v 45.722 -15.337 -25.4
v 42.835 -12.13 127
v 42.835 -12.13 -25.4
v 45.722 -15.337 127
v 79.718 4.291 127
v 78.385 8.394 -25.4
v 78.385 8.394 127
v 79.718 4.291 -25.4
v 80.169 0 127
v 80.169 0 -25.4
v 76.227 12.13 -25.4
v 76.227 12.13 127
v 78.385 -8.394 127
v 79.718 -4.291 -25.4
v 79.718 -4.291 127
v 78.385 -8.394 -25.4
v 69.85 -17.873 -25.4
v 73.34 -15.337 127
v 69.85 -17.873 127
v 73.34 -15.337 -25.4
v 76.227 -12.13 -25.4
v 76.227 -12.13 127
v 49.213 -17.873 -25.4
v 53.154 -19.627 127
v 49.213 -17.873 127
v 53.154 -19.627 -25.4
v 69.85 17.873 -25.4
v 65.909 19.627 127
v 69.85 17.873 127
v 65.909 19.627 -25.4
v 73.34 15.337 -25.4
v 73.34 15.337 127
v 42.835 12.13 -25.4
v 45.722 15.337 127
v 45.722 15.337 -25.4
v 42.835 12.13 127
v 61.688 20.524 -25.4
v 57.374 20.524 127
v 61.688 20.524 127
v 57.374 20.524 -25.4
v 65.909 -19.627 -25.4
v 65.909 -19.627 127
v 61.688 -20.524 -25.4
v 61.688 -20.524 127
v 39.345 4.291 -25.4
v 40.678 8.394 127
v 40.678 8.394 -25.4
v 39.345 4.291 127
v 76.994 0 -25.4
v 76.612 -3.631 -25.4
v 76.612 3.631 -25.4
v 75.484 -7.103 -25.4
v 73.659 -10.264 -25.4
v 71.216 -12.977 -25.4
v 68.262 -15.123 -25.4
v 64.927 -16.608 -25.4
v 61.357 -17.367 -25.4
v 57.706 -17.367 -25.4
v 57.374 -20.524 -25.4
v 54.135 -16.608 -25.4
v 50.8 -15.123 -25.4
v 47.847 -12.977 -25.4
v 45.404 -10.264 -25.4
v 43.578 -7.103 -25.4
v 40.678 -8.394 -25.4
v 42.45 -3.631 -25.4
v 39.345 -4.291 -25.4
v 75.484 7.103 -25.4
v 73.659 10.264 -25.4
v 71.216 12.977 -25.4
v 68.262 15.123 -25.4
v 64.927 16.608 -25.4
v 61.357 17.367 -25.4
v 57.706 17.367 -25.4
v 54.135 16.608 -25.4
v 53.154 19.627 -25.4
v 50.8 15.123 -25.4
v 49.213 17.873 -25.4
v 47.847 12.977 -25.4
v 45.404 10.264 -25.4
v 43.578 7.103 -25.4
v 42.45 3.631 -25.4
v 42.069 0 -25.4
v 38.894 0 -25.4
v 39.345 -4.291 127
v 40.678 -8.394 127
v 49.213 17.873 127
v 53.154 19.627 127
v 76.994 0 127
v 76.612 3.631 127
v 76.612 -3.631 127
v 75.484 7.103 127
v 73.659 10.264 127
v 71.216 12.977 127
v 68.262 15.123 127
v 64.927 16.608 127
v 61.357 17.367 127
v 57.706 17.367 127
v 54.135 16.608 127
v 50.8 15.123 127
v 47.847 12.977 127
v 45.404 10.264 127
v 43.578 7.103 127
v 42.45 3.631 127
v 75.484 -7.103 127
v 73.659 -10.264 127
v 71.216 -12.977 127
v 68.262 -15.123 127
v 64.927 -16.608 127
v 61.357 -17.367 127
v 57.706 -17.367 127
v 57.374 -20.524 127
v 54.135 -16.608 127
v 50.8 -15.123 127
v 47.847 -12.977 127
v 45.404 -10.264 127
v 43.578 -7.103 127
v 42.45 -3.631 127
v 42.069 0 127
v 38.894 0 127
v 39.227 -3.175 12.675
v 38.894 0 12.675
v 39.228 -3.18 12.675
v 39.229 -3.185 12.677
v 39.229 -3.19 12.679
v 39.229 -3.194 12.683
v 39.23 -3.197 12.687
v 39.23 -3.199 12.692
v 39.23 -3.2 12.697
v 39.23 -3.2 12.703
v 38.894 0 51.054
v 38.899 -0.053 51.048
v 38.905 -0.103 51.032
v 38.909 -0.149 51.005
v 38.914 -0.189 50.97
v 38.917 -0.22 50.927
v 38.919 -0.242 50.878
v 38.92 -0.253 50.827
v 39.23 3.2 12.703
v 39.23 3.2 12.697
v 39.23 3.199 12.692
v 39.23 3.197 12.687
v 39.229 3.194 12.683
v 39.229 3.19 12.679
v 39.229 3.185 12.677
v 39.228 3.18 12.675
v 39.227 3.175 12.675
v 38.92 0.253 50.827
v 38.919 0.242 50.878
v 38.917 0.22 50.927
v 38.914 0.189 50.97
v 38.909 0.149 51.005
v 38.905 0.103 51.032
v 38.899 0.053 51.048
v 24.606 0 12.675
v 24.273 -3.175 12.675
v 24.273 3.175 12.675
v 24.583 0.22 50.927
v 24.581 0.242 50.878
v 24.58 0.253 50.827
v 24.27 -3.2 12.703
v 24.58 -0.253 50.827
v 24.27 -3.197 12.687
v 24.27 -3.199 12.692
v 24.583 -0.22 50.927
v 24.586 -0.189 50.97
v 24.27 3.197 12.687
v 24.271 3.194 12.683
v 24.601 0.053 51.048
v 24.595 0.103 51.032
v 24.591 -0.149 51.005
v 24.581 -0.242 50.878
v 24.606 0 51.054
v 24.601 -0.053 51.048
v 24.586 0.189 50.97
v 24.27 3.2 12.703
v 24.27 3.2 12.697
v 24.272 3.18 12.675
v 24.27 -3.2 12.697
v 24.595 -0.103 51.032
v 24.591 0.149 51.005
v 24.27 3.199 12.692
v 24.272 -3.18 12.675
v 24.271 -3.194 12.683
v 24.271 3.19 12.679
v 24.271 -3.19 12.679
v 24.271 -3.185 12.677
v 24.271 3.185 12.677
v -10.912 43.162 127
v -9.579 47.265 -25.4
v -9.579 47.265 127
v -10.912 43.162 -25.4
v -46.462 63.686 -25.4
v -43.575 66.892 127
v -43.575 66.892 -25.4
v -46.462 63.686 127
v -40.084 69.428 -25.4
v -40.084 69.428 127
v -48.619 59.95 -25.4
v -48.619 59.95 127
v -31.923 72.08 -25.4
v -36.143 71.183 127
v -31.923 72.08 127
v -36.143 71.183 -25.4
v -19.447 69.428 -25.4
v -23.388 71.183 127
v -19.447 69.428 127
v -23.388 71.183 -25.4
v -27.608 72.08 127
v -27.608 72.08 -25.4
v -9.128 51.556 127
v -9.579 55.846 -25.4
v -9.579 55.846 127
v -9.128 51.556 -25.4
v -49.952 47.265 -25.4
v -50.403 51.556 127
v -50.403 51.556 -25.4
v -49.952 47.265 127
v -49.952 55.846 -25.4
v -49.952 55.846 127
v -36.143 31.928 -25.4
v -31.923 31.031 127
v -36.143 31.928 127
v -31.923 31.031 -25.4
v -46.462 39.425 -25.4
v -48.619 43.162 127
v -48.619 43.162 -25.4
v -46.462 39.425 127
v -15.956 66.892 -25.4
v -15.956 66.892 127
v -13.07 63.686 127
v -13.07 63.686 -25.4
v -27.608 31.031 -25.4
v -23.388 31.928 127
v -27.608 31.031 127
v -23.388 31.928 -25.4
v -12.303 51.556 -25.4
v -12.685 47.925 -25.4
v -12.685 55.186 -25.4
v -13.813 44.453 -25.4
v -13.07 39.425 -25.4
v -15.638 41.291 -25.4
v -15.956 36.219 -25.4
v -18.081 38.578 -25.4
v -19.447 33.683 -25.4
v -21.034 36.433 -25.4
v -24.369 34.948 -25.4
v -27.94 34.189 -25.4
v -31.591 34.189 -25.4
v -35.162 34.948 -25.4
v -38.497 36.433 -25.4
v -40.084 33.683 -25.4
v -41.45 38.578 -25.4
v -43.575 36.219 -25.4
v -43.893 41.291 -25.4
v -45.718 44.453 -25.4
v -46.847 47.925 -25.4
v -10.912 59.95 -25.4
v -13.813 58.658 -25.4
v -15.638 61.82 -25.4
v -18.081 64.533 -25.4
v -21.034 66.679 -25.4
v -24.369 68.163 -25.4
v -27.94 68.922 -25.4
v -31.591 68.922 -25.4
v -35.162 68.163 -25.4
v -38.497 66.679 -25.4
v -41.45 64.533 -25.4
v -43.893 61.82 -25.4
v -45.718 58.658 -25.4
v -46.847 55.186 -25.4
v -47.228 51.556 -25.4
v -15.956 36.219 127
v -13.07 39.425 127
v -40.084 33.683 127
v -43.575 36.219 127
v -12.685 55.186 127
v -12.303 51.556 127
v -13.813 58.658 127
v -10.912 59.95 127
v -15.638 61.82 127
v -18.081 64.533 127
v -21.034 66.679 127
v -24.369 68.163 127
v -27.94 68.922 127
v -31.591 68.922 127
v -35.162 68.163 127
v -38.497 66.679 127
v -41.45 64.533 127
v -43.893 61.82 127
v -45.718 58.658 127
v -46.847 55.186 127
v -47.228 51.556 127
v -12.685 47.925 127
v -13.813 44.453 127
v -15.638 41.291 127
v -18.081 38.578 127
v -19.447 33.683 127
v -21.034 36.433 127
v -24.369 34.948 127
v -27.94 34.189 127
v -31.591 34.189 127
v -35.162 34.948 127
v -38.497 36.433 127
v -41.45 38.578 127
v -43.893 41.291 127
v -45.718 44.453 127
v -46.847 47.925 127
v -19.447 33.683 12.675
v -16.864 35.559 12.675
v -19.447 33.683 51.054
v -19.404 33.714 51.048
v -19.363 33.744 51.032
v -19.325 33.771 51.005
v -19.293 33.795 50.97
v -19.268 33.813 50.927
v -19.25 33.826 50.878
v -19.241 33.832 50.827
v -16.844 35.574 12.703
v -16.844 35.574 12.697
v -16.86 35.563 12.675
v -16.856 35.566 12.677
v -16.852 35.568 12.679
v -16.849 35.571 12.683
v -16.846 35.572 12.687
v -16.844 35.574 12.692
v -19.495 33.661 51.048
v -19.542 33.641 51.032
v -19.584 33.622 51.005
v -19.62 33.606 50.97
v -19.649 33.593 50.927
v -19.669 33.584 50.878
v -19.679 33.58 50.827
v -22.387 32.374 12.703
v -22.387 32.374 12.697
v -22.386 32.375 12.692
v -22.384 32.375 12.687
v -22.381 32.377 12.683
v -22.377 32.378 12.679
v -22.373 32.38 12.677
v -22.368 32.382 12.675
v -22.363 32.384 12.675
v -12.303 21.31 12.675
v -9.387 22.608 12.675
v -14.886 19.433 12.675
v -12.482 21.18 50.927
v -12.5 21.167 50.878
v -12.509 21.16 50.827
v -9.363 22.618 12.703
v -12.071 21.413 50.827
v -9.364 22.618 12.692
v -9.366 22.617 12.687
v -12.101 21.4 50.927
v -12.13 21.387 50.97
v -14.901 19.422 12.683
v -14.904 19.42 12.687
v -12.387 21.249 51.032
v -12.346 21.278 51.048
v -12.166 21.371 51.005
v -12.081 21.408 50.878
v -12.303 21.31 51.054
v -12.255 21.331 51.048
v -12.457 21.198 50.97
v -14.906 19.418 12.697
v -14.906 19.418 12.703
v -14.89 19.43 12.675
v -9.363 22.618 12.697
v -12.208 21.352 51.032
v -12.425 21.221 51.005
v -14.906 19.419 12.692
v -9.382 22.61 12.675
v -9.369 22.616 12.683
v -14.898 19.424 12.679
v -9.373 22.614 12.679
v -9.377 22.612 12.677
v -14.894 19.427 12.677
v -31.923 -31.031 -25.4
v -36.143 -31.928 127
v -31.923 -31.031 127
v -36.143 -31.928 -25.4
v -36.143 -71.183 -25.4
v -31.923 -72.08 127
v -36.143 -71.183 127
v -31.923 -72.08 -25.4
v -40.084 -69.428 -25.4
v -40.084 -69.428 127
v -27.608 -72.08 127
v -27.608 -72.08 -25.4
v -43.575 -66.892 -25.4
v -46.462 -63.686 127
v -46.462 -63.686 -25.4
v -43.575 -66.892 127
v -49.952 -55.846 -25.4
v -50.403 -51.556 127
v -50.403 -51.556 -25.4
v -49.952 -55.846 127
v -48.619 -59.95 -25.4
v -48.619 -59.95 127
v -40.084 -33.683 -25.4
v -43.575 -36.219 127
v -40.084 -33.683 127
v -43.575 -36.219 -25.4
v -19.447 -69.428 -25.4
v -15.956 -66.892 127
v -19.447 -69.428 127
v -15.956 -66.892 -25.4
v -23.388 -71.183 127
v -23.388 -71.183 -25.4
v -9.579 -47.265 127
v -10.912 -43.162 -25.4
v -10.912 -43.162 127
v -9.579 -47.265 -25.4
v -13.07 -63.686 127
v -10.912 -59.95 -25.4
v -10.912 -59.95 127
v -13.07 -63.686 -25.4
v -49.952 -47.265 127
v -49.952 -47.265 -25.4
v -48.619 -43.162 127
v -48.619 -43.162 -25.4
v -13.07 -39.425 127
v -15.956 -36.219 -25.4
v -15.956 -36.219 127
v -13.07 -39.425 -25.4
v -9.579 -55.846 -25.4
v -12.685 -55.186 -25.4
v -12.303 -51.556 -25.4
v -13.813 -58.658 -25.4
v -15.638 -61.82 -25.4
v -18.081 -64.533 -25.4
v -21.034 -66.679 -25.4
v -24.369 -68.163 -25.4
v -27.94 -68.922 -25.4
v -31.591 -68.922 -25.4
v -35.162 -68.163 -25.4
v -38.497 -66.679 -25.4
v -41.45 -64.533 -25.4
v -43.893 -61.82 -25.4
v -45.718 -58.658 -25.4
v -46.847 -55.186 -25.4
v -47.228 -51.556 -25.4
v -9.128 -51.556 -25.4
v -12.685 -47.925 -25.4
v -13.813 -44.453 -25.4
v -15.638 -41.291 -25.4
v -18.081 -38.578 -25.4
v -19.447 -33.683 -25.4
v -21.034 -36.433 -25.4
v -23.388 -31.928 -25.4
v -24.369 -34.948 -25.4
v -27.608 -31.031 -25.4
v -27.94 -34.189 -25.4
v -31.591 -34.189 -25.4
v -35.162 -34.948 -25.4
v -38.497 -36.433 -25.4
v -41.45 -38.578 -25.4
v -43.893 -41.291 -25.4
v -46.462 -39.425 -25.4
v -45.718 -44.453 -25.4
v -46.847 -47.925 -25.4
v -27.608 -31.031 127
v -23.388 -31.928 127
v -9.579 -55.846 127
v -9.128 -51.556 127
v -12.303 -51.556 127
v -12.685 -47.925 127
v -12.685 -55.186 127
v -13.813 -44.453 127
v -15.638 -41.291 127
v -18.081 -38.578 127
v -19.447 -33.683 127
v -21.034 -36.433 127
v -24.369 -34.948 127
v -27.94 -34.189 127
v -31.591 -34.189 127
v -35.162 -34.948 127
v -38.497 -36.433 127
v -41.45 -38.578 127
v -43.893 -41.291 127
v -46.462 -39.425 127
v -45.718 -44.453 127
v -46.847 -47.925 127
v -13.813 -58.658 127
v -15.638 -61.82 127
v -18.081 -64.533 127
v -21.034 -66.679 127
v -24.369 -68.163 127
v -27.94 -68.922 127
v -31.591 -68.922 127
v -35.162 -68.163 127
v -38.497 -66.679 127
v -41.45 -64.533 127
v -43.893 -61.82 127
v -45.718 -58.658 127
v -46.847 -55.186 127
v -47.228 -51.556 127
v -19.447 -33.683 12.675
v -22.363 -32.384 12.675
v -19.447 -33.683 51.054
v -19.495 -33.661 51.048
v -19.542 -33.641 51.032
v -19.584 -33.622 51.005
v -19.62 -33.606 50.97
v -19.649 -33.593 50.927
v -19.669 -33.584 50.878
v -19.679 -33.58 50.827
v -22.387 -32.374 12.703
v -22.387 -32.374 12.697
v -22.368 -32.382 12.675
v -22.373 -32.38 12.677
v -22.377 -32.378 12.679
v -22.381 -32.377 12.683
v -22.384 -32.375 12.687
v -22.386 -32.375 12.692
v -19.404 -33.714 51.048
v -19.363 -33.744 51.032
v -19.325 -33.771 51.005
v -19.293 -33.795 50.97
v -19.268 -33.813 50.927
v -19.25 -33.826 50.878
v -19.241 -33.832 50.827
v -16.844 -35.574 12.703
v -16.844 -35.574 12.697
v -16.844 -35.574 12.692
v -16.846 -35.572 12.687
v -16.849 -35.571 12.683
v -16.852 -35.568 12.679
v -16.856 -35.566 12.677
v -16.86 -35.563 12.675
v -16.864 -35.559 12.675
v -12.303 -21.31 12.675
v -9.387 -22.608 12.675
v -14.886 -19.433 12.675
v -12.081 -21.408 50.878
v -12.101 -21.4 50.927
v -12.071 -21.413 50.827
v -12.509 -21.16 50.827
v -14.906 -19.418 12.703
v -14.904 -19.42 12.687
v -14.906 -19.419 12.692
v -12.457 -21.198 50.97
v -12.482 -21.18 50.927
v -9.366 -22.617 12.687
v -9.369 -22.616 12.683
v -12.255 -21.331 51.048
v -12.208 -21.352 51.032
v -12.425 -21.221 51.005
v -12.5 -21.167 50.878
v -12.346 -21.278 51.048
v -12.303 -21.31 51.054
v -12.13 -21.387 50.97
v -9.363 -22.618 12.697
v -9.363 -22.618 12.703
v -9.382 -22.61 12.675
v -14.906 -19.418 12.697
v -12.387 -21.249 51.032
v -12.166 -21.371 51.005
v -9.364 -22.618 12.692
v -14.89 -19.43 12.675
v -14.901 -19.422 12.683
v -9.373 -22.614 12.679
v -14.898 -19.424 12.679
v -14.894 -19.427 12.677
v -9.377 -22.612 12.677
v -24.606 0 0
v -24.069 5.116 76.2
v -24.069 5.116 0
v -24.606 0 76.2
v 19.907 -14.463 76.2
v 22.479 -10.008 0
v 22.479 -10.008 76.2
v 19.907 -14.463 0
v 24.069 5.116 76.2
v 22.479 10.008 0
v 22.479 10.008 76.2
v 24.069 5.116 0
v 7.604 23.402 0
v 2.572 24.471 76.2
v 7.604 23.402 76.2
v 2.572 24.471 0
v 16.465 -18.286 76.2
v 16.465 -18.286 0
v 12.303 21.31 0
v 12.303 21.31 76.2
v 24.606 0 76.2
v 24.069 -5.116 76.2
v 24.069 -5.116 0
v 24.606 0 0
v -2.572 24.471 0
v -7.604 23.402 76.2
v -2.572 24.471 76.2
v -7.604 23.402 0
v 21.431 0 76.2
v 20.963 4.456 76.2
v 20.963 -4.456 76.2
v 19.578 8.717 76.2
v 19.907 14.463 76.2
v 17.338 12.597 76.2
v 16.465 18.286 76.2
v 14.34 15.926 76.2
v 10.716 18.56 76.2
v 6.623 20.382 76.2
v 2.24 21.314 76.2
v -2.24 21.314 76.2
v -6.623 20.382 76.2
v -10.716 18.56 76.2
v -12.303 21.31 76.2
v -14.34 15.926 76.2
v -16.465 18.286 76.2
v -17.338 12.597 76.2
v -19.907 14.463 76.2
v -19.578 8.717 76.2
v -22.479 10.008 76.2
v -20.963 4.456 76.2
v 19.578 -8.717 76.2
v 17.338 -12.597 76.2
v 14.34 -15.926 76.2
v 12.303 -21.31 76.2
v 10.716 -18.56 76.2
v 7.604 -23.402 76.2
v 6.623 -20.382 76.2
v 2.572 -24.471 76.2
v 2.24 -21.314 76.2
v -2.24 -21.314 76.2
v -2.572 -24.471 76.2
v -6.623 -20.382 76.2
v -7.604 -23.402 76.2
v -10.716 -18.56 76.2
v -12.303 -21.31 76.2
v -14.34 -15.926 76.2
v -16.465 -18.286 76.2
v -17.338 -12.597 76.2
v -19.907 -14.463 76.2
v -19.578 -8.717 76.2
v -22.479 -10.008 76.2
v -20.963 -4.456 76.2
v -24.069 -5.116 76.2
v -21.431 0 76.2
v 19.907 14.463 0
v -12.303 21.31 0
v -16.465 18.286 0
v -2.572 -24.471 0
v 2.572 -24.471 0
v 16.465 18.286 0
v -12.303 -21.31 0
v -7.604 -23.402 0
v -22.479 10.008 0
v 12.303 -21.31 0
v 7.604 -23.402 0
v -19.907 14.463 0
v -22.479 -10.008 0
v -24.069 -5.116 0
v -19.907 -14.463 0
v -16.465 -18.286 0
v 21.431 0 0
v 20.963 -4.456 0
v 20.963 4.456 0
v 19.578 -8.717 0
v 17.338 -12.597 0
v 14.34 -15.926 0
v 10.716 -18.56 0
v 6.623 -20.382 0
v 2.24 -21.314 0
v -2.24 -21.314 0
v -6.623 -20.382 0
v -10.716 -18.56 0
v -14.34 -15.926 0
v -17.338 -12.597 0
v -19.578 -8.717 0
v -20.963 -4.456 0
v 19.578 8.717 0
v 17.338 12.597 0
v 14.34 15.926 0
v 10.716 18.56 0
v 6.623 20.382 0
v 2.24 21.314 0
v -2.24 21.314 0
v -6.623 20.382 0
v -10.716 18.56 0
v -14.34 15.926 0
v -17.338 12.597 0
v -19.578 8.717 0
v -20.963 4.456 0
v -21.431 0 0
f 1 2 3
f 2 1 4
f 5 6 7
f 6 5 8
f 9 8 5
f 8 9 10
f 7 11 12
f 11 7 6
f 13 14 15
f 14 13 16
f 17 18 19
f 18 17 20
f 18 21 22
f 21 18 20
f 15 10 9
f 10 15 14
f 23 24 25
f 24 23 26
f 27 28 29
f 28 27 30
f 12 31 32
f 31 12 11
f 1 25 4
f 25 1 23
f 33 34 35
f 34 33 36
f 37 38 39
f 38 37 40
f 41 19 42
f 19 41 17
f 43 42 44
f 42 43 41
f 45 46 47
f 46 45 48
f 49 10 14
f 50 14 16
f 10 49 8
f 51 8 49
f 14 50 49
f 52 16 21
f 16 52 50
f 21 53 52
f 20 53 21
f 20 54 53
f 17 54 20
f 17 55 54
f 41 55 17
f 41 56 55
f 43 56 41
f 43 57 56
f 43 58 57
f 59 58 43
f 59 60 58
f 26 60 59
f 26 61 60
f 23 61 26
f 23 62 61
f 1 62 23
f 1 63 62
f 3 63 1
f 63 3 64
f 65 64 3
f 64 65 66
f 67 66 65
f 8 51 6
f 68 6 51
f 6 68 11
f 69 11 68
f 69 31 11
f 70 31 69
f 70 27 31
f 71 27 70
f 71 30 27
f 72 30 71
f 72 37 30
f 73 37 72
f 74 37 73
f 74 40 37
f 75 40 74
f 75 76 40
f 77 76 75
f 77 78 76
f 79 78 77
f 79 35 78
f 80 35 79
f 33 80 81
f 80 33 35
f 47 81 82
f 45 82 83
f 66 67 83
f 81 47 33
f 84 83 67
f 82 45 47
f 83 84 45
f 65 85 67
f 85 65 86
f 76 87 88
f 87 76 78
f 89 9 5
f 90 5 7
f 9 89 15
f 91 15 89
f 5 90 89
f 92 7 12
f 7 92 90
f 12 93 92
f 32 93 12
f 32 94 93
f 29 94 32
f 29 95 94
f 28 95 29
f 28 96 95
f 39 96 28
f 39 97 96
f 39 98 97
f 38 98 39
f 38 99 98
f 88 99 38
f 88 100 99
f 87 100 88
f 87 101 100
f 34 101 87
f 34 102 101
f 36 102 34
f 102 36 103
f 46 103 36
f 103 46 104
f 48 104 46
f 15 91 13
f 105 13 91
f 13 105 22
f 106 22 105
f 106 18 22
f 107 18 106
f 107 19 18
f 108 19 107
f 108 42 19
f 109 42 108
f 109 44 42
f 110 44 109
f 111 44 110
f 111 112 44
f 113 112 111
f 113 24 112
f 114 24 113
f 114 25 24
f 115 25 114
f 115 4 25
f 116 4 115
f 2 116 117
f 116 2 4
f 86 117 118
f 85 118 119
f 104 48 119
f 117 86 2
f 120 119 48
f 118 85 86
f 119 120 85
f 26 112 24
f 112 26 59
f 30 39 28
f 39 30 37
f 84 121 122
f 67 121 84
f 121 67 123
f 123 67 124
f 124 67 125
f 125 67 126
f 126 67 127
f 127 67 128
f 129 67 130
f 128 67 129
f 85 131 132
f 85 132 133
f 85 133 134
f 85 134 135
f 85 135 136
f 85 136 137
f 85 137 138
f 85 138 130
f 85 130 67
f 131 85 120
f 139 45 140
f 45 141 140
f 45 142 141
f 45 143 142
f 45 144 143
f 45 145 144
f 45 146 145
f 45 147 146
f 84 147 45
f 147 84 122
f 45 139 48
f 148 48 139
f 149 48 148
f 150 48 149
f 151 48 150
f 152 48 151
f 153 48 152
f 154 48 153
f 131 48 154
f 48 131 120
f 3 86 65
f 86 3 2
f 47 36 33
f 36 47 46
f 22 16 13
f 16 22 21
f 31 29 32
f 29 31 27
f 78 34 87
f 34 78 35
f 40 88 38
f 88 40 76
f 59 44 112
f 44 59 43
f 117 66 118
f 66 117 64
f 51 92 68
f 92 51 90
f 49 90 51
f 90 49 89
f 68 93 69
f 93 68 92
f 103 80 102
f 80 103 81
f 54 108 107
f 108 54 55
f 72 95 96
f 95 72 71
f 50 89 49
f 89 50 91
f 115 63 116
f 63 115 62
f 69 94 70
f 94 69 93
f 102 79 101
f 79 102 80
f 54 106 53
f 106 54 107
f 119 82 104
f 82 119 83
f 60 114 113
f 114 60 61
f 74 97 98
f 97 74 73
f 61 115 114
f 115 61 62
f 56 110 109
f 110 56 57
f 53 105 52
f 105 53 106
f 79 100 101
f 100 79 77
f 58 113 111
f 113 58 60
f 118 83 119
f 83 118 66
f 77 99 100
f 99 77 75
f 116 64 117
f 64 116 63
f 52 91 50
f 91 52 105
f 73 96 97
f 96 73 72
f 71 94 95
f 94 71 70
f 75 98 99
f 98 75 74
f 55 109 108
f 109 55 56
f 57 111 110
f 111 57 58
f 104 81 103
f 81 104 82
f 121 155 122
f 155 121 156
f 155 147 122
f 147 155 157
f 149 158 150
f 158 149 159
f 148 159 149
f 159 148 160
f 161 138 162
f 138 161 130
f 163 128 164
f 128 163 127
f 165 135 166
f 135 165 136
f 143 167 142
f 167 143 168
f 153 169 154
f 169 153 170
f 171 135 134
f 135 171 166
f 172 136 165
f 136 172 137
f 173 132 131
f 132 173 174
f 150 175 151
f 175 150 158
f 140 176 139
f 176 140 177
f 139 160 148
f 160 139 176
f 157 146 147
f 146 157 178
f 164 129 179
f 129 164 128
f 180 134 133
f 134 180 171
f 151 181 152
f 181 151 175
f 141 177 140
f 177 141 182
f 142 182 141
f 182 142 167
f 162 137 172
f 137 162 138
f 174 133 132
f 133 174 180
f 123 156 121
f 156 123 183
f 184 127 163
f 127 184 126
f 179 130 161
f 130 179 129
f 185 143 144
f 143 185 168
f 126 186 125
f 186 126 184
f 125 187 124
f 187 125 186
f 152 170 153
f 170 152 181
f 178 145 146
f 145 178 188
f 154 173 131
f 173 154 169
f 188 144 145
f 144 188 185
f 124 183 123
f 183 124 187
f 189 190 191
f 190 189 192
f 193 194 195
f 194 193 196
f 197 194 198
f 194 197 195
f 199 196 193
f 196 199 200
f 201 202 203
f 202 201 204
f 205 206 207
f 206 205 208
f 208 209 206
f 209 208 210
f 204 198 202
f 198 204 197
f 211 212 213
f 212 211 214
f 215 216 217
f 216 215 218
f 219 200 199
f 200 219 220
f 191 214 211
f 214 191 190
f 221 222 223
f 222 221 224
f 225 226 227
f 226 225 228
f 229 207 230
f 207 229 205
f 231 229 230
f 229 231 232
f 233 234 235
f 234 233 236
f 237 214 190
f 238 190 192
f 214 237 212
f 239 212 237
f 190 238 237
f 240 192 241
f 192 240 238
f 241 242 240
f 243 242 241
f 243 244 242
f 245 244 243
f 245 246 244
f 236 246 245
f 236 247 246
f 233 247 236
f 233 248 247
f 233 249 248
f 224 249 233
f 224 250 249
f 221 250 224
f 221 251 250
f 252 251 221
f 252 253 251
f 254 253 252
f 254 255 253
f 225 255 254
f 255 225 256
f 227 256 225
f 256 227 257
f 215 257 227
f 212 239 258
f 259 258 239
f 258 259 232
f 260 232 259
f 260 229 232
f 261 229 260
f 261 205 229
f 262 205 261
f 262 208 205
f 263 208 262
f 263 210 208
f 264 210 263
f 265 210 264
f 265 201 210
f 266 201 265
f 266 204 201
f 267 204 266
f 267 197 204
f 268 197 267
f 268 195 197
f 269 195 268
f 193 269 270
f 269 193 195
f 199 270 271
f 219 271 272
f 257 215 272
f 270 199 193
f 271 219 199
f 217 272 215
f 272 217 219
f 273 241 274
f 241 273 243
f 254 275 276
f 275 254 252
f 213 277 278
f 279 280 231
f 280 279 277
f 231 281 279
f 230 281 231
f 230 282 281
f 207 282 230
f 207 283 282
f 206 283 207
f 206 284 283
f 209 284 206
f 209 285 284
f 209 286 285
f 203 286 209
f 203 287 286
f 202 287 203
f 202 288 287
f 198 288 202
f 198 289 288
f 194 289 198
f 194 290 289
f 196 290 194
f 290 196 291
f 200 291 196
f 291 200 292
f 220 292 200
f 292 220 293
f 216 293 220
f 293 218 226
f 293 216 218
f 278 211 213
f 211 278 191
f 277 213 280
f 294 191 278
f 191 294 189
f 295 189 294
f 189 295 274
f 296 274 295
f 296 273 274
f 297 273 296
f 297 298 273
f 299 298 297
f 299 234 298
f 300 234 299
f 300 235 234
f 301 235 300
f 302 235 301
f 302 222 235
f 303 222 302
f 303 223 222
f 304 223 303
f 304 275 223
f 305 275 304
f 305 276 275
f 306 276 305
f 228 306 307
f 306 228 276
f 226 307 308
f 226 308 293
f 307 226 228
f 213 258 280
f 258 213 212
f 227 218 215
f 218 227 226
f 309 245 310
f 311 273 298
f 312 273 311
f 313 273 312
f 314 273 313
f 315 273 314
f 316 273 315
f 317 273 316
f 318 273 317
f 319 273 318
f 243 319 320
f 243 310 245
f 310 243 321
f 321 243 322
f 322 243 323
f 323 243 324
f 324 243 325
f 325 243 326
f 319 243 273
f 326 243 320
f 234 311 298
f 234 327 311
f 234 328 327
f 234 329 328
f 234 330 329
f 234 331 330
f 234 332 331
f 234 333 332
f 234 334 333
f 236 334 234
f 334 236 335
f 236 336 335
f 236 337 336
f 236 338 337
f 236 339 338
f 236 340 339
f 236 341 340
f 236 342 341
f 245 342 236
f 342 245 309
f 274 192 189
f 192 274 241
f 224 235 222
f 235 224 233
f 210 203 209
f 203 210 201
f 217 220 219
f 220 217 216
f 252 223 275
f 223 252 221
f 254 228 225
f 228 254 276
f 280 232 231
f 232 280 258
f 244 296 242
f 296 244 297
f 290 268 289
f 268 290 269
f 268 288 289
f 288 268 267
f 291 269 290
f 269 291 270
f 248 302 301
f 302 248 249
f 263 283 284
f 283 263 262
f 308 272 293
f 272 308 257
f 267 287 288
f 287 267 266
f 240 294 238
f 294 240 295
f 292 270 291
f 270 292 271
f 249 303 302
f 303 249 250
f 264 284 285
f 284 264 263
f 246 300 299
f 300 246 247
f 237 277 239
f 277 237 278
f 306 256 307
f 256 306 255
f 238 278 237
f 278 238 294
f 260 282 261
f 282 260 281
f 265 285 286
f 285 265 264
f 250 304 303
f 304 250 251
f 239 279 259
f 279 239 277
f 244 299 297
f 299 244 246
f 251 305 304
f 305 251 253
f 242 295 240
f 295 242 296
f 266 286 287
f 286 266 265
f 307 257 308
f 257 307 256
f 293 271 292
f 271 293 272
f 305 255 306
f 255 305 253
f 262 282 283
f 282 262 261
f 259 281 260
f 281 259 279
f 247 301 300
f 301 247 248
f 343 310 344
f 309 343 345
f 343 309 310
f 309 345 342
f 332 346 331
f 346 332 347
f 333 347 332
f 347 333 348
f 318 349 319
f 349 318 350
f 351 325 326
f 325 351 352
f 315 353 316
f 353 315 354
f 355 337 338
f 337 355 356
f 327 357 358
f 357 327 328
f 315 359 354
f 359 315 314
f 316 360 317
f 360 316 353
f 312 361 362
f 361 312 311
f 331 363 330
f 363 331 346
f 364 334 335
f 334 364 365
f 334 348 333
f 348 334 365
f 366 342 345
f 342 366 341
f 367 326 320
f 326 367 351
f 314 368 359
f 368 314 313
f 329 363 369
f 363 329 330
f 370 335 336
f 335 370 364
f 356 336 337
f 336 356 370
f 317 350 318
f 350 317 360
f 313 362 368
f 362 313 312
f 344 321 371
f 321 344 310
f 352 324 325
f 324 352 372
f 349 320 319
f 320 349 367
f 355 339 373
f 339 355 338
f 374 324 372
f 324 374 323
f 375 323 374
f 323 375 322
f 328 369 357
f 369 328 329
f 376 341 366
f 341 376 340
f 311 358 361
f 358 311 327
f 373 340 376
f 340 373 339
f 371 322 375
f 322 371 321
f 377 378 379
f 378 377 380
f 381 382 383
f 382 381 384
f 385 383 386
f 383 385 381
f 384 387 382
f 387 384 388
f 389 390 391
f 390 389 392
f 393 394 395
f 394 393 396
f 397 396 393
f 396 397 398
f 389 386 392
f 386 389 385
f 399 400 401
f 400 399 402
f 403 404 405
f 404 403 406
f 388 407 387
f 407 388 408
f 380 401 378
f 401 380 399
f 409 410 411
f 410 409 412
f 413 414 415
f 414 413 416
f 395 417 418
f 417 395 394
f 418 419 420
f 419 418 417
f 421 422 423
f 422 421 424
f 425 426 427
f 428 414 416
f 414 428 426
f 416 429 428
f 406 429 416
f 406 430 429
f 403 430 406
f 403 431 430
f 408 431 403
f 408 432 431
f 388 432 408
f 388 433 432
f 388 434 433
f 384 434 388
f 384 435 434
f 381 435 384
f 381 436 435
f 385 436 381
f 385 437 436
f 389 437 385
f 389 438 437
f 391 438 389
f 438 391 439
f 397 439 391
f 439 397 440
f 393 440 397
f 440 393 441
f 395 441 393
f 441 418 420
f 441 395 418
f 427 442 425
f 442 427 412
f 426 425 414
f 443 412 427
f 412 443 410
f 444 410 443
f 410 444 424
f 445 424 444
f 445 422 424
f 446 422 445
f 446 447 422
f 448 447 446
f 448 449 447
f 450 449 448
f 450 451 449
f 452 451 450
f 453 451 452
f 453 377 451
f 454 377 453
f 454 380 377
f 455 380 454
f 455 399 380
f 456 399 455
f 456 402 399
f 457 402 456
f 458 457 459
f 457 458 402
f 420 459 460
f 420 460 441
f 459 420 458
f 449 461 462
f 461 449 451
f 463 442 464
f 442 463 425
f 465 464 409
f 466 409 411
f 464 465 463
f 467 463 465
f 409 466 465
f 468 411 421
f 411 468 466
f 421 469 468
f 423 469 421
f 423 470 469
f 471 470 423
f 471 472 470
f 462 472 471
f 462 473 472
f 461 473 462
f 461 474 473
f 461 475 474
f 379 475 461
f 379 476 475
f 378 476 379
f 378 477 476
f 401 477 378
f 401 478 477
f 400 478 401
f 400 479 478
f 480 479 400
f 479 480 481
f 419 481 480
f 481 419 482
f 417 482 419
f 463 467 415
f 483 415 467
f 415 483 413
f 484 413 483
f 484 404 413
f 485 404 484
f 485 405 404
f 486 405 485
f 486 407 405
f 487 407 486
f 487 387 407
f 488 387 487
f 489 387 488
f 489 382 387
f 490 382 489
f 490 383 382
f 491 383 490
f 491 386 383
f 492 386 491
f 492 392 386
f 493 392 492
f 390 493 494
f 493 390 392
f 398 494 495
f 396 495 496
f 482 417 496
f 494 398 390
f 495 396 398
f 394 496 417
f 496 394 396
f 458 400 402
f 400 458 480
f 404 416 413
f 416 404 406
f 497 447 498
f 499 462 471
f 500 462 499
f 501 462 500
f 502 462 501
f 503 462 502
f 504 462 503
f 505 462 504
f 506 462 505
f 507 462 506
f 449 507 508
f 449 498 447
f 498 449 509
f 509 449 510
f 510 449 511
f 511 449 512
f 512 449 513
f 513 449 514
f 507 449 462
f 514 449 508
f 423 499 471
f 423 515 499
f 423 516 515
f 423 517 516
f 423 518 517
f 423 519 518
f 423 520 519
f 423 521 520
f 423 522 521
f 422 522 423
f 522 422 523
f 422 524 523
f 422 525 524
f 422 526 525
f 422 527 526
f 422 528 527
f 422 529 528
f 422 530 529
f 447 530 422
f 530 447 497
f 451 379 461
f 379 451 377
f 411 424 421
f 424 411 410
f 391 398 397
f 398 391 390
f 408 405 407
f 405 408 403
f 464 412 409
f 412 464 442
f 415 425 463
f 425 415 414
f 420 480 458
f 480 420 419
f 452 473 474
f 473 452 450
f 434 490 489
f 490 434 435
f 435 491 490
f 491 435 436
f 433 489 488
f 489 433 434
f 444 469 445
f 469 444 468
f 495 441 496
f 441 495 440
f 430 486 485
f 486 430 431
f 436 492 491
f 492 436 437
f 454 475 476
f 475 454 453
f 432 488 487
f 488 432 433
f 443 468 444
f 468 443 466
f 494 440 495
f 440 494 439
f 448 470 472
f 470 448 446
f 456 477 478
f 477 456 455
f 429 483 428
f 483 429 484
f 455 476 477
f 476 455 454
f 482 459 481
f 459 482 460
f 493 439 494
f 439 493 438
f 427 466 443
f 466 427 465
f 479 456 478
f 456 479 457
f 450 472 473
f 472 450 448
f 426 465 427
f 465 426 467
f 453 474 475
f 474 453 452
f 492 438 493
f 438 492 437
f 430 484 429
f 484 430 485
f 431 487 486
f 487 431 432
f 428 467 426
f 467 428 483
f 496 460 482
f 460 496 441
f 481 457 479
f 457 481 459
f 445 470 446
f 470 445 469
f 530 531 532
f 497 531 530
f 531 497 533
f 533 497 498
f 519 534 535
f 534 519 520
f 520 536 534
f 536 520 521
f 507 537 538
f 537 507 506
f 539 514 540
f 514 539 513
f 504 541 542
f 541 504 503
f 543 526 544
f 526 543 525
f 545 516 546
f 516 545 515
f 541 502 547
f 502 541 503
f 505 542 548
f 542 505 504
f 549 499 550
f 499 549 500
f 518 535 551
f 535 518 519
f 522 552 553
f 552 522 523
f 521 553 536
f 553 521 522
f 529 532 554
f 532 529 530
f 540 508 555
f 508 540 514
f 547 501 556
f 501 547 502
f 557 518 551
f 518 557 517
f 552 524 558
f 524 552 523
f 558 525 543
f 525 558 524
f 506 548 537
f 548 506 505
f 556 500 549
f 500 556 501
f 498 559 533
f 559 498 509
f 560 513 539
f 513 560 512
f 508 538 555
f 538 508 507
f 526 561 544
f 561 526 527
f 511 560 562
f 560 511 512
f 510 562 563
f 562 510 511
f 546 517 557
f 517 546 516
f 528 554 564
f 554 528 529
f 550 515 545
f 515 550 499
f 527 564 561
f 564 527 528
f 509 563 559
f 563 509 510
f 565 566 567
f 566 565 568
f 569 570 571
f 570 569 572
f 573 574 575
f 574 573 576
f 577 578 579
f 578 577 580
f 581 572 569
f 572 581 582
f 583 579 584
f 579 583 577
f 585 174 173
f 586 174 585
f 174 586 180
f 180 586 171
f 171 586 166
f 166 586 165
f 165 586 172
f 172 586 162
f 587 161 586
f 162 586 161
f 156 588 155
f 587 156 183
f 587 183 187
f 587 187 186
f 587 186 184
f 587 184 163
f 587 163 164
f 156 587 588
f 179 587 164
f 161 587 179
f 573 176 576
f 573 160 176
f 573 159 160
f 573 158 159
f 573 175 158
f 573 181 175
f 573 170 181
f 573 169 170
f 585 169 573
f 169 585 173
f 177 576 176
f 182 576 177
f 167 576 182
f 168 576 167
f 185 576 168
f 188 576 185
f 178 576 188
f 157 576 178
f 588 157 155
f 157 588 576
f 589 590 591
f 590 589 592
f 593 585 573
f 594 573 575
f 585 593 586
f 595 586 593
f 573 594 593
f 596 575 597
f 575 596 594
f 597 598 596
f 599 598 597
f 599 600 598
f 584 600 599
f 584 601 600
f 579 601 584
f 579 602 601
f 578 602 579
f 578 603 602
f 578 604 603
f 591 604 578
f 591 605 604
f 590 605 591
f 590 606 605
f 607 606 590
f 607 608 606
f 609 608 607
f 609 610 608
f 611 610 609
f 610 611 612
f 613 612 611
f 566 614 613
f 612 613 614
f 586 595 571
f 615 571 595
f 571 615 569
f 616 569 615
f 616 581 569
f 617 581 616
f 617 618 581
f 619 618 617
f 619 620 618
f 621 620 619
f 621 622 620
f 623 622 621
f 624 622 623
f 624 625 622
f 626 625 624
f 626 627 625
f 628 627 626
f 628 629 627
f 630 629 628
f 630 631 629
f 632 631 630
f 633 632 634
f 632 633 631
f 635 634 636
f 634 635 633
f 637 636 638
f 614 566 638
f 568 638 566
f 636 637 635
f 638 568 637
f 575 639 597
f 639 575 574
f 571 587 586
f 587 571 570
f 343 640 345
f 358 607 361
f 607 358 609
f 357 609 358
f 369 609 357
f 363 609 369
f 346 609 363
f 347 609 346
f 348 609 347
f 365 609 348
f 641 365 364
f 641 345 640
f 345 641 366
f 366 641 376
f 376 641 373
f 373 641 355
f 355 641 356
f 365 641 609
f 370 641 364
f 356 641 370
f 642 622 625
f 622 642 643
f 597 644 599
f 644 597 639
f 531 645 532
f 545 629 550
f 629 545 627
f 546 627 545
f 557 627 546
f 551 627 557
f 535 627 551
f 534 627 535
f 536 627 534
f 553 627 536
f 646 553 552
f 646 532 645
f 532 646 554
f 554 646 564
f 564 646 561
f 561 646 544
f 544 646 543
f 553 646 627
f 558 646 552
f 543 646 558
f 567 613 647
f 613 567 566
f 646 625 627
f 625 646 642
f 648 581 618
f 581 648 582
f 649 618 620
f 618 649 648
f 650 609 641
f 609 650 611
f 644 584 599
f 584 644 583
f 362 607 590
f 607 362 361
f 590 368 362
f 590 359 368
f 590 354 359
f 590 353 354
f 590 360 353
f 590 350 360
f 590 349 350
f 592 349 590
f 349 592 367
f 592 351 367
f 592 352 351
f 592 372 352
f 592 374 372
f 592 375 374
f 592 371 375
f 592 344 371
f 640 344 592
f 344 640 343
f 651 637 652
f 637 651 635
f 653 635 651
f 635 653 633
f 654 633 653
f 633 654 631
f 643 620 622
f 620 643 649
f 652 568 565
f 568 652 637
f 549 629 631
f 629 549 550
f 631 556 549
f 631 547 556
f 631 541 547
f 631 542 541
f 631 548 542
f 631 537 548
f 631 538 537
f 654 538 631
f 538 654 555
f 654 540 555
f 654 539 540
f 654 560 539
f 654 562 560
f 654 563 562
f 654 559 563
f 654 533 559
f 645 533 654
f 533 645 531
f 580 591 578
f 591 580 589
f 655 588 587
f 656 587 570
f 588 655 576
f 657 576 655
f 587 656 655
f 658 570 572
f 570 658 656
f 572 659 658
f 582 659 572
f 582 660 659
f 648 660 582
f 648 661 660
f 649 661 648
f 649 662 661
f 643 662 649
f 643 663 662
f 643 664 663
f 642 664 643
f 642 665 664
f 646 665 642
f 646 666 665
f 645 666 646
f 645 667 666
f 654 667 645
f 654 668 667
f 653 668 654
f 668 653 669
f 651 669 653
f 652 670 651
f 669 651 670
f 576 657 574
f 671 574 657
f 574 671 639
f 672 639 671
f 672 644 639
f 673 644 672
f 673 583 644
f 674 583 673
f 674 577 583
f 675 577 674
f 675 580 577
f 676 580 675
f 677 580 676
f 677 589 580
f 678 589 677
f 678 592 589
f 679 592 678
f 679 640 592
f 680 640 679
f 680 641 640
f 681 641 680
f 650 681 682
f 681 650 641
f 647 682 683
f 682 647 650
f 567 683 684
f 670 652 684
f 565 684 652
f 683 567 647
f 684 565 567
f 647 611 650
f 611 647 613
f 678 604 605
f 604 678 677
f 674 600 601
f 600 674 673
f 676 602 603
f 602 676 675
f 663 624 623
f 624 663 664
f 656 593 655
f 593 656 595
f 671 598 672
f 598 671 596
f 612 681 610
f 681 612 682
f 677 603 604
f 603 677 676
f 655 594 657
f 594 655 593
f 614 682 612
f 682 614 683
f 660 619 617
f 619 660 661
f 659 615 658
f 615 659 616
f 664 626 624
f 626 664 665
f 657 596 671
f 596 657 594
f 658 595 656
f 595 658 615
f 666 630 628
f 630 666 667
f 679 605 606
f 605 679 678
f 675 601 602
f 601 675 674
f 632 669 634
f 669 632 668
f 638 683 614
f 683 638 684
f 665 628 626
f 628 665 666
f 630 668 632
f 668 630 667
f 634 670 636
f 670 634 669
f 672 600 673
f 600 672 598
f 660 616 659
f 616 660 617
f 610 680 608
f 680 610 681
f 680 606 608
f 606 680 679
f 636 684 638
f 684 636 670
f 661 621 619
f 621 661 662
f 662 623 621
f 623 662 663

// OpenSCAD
// preview[view:south east, tilt: top diagonal]

//What units are you measuring in?
units = "Inches"; //[Inches, Millimeters]

//Wall thickness for the engine brackets
wall_t = .125;

//Resolution
$fn = 30;

/* [Secondary Engines] */

//Secondary engine diameter
se_d = 1.375;
//Secondary engine mount height
se_h = 6;
//How many secondary engines are there?
se_n = 3;
//distance between the bottom of the main engine to the bottom of the second engine
se_me_diff = 1;

/* [Main Engine] */

//Main engine diameter
me_d = 1.6875;
// main engine mount height
me_h = 3;
//distance between bottom of the spacer and the bottom of the main engine
me_s_diff = .5;

/* [Spacer] */

//Spacer length
s_l = .5625;
//Spacer thickness
s_t = .25;
//Spacer height
s_h = 1.5;

/* [Hidden] */

//Makes the spacer arms overlap
overlap_amount = wall_t*2;

engine_spacer_render();

//Builds the mount to hold the secondary rocket engines
module secondary_engine_mount(){
  difference(){
    cylinder(r = se_d/2+wall_t, h = se_h);
    cylinder(r = se_d/2, h = se_h);
  }
}

//Builds the mount to hold the main engine
module main_engine_mount(){
  difference(){
    cylinder(r = me_d/2+wall_t, h = me_h);
    cylinder(r = me_d/2, h = me_h);
  }
}

//Builds the spacer that connects the secondary engines to the main engine
module spacer(){
  _r = .001;
  difference(){
    translate([me_d/2,0,0]) rotate([0,90,0]) hull(){
      for(j = [-1:2:1])
        translate([0,s_t/2*j,0])
          cylinder(r = _r, h = s_l+overlap_amount);
        translate([-s_h,0,0])
          cylinder(r = .01, h = s_l+overlap_amount);
    }
    union(){
      cylinder(r = me_d/2, h = s_h*2.5, center = true);
      translate([s_l+(me_d/2+wall_t)+(se_d/2+wall_t),0,0])
        cylinder(r = se_d/2, h = s_h*2.5, center = true);
    }
  }
}
//Connects all of the different parts together
module engine_spacer(){
  for(i = [0:360/se_n:360])
    rotate(i){
      translate([s_l+(me_d/2+wall_t)+(se_d/2+wall_t), 0, -se_me_diff])
        secondary_engine_mount();
      translate([0,0,me_s_diff])
        spacer();
    }
  main_engine_mount();
}
//converts the model to inches if units = "Inches"
module engine_spacer_render(){
  if(units == "Inches")
   scale(25.4) engine_spacer();
  else if (units == "Millimeters")
    engine_spacer();
}
